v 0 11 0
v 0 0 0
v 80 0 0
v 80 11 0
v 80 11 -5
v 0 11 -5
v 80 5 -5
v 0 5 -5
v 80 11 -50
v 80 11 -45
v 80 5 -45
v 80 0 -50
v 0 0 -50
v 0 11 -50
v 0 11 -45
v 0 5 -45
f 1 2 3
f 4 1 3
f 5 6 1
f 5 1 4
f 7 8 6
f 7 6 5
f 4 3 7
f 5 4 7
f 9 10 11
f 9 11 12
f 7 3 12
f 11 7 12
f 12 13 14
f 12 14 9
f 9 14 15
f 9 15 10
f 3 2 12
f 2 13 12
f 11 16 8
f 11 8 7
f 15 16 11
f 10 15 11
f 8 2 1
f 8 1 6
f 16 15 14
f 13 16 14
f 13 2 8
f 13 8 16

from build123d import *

# Parameters (mm, degrees)
SKETCH1_W           = 80
SKETCH1_H           = 40
SKETCH1_H_2         = 5
BOSS_EXTRUDE2_DEPTH = 5
SKETCH2_W           = 80
SKETCH2_H           = 5
BOSS_EXTRUDE3_DEPTH = 6


with BuildPart() as part:
    # Sketch1 → Boss-Extrude2 (new body)
    with BuildSketch(Plane(origin=(0, 0, 0), x_dir=(1, 0, 0), z_dir=(0, 1, 0))):
        with Locations((40, 25)):
            Rectangle(SKETCH1_W, SKETCH1_H)
        with Locations((40, 2.5)):
            Rectangle(SKETCH1_W, SKETCH1_H_2)
        with Locations((40, 47.5)):
            Rectangle(SKETCH1_W, SKETCH1_H_2)
    extrude(amount=BOSS_EXTRUDE2_DEPTH)

    # Sketch2 → Boss-Extrude3 (add)
    with BuildSketch(Plane(origin=(0, 5, 0), x_dir=(1, 0, 0), z_dir=(0, 1, 0))):
        with Locations((40, 47.5)):
            Rectangle(SKETCH2_W, SKETCH2_H)
        with Locations((40, 2.5)):
            Rectangle(SKETCH2_W, SKETCH2_H)
    extrude(amount=BOSS_EXTRUDE3_DEPTH)


solid = part.part
